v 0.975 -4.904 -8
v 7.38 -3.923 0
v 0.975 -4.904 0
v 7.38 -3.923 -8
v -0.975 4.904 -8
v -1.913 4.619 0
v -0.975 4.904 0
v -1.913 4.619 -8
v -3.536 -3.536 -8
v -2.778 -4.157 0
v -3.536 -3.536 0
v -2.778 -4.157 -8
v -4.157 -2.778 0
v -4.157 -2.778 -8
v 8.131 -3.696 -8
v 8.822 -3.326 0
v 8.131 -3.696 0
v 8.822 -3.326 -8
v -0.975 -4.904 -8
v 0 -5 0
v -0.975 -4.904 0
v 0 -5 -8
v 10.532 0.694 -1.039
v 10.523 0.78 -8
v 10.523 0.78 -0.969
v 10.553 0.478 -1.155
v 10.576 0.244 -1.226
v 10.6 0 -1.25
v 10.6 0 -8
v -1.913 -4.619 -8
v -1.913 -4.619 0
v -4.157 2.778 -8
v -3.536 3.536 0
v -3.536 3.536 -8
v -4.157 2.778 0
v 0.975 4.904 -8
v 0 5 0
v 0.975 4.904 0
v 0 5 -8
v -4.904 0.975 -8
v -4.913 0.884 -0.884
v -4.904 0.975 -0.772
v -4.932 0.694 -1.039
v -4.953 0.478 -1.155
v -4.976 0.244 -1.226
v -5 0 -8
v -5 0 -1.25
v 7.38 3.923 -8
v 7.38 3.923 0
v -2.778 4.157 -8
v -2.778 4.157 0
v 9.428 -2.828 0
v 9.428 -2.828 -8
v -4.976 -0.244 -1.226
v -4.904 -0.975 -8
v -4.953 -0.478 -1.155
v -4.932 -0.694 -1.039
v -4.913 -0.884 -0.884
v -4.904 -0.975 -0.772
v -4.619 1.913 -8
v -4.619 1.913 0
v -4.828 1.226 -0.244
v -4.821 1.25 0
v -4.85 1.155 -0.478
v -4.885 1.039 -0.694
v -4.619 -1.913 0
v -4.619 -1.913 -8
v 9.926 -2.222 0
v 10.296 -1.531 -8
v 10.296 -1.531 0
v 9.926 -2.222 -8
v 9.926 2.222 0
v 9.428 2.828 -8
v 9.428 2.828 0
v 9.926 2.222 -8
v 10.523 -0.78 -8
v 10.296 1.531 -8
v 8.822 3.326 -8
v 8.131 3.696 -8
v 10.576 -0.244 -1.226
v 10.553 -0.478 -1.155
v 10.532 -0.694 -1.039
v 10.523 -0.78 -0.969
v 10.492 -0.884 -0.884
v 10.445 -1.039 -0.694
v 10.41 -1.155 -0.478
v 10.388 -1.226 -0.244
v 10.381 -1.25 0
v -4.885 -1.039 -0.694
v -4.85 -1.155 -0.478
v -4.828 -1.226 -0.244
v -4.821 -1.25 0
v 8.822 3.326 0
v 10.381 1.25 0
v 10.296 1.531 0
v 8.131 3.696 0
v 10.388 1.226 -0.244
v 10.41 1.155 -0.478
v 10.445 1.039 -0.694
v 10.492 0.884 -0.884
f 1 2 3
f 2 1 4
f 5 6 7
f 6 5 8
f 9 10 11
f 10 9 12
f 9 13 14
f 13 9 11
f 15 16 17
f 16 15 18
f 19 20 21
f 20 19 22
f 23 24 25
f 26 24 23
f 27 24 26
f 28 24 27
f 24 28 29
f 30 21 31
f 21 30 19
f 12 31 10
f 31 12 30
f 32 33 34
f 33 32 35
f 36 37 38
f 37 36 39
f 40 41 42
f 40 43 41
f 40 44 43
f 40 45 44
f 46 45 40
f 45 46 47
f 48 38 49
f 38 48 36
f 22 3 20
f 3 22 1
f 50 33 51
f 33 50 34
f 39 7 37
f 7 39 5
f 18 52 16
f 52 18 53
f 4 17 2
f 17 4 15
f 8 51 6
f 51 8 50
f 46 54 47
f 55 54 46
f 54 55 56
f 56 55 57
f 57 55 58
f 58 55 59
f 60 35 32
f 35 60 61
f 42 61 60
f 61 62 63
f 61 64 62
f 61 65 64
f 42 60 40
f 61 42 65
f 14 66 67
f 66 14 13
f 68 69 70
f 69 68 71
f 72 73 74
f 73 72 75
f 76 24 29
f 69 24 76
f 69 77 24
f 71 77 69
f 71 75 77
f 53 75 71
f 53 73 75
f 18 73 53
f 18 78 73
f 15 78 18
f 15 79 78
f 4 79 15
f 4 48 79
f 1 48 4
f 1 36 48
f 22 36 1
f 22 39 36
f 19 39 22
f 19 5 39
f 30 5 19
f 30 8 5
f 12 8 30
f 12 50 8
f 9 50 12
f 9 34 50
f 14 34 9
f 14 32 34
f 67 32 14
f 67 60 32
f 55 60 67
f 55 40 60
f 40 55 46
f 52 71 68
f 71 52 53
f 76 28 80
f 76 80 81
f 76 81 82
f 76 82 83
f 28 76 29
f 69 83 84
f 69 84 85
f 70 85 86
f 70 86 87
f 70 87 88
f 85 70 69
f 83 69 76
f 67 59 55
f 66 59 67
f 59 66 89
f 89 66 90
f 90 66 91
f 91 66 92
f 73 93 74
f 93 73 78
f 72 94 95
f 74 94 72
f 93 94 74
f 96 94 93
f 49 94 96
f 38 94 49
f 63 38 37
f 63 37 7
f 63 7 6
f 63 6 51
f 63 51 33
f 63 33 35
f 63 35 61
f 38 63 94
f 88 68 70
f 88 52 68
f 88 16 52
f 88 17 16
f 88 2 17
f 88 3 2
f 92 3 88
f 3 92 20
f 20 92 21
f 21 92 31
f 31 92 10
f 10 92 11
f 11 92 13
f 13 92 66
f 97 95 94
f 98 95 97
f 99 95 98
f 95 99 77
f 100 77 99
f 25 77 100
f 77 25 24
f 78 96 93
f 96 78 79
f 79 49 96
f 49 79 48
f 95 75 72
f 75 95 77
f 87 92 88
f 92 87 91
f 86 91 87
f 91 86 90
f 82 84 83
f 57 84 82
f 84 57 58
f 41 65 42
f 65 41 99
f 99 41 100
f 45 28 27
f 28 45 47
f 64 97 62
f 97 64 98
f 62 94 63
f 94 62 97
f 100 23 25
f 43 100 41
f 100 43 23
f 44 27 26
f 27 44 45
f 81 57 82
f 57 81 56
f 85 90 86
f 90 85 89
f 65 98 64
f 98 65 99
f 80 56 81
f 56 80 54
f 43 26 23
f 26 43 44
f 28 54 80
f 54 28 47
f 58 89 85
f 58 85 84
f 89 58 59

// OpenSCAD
// COBRA Finger Segment - MIDDLE
// Length: 6.6000000000000005mm, Width: 10mm

$fn = 32;

module finger_segment() {
    difference() {
        hull() {
            translate([0, 0, -4])
            cylinder(h=8, d=10, center=true);
            
            translate([6.6000000000000005, 0, -4])
            cylinder(h=8, d=8.0, center=true);
        }
        
        // Tendon channel
        translate([3.3000000000000003, 0, 0])
        rotate([0, 90, 0])
        cylinder(h=8.600000000000001, d=2.5, center=true);
        
        // Pivot holes
        translate([0, 0, 0])
        rotate([0, 90, 0])
        cylinder(h=12, d=2.5, center=true);
        
        translate([6.6000000000000005, 0, 0])
        rotate([0, 90, 0])
        cylinder(h=12, d=2.5, center=true);
    }
}

finger_segment();
